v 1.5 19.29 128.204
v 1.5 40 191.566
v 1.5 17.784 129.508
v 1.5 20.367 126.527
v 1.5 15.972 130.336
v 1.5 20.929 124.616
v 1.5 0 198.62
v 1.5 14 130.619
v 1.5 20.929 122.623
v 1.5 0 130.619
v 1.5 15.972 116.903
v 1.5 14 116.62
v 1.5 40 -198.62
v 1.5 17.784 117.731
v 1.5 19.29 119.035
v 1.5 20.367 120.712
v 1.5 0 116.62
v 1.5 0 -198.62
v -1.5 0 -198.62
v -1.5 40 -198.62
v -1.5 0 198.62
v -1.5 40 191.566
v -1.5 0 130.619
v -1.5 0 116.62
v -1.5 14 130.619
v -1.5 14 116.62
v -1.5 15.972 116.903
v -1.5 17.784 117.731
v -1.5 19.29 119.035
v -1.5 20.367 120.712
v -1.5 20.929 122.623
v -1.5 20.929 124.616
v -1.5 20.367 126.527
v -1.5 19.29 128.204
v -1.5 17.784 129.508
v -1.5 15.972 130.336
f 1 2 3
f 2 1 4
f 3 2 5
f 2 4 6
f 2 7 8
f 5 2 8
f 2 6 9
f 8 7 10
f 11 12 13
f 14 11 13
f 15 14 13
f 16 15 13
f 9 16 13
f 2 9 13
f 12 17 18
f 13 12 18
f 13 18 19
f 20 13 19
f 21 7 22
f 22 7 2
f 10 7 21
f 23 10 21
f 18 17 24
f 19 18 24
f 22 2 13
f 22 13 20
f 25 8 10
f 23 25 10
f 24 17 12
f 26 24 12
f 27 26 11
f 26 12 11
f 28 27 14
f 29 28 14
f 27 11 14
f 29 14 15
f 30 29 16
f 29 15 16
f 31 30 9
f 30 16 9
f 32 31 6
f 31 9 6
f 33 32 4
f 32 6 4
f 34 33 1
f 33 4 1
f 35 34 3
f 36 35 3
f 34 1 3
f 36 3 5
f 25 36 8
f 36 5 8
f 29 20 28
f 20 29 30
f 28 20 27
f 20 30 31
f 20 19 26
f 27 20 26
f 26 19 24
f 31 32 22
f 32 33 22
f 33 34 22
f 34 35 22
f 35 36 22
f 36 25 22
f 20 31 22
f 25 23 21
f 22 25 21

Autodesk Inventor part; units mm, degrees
ref_plane "YZ Plane" through (0, 0, 0) normal (1, 0, 0) x (0, 1, 0)
ref_plane "XZ Plane" through (0, 0, 0) normal (0, 1, 0) x (-1, 0, 0)
ref_plane "XY Plane" through (0, 0, 0) normal (0, 0, 1) x (1, 0, 0)
sketch "Sketch2" plane through (0, 0, 0) normal (0, 1, 0) x (-1, 0, 0)
  line L0 (-1.5, -198.6195) -> (1.5, -198.6195)
  line L1 (1.5, -198.6195) -> (1.5, 198.6195)
  line L2 (1.5, 198.6195) -> (-1.5, 198.6195)
  line L3 (-1.5, 198.6195) -> (-1.5, -198.6195)
  line L4 (-1.5, -198.6195) -> (1.5, 198.6195) construction
  line L5 (1.5, -198.6195) -> (-1.5, 198.6195) construction
  point P0 (0, 0)
  dimension "d0" = 3
  dimension "d1" = 397.239
extrude "Extrusion1" add sketch "Sketch2" along normal blind 40
sketch "Sketch3" plane through (1.5, 0, 198.6195) normal (1, 0, 0) x (0, 0, -1)
  line L0 (397.239, 0) -> (0, 0) projected
  line L1 (68, 0) -> (82, 0)
  line L2 (82, 0) -> (82, 14)
  line L3 (68, 14) -> (68, 0)
  arc A0 (82, 14) -> (68, 14) centre (75, 14) ccw
  arc A1 (68, 14) -> (82, 14) centre (75, 14) ccw construction
  line L4 (0, 0) -> (0, 40) projected
  point P0 (198.6195, 0)
  dimension "d4" = 14
  dimension "d5" = 14
  dimension "d6" = 14
  dimension "d9" = 75
extrude "Extrusion2" cut sketch "Sketch3" against normal through all
sketch "Sketch4" plane through (1.5, 0, -198.6195) normal (1, 0, 0) x (0, 0, -1)
  line L0 (-329.239, 0) -> (-397.239, 0) projected
  line L1 (-397.239, 0) -> (-397.239, 40) projected
  line L2 (-397.239, 0) -> (-397.239, 40)
  line L3 (-397.239, 40) -> (-390.1859, 40)
  line L4 (-397.239, 40) -> (0, 40) projected
  line L5 (-397.239, 0) -> (-390.1859, 40)
  point P0 (-198.6195, 0)
  dimension "d10" = 10
extrude "Extrusion3" cut sketch "Sketch4" against normal through all
properties part number "wall-inner-plunger"
